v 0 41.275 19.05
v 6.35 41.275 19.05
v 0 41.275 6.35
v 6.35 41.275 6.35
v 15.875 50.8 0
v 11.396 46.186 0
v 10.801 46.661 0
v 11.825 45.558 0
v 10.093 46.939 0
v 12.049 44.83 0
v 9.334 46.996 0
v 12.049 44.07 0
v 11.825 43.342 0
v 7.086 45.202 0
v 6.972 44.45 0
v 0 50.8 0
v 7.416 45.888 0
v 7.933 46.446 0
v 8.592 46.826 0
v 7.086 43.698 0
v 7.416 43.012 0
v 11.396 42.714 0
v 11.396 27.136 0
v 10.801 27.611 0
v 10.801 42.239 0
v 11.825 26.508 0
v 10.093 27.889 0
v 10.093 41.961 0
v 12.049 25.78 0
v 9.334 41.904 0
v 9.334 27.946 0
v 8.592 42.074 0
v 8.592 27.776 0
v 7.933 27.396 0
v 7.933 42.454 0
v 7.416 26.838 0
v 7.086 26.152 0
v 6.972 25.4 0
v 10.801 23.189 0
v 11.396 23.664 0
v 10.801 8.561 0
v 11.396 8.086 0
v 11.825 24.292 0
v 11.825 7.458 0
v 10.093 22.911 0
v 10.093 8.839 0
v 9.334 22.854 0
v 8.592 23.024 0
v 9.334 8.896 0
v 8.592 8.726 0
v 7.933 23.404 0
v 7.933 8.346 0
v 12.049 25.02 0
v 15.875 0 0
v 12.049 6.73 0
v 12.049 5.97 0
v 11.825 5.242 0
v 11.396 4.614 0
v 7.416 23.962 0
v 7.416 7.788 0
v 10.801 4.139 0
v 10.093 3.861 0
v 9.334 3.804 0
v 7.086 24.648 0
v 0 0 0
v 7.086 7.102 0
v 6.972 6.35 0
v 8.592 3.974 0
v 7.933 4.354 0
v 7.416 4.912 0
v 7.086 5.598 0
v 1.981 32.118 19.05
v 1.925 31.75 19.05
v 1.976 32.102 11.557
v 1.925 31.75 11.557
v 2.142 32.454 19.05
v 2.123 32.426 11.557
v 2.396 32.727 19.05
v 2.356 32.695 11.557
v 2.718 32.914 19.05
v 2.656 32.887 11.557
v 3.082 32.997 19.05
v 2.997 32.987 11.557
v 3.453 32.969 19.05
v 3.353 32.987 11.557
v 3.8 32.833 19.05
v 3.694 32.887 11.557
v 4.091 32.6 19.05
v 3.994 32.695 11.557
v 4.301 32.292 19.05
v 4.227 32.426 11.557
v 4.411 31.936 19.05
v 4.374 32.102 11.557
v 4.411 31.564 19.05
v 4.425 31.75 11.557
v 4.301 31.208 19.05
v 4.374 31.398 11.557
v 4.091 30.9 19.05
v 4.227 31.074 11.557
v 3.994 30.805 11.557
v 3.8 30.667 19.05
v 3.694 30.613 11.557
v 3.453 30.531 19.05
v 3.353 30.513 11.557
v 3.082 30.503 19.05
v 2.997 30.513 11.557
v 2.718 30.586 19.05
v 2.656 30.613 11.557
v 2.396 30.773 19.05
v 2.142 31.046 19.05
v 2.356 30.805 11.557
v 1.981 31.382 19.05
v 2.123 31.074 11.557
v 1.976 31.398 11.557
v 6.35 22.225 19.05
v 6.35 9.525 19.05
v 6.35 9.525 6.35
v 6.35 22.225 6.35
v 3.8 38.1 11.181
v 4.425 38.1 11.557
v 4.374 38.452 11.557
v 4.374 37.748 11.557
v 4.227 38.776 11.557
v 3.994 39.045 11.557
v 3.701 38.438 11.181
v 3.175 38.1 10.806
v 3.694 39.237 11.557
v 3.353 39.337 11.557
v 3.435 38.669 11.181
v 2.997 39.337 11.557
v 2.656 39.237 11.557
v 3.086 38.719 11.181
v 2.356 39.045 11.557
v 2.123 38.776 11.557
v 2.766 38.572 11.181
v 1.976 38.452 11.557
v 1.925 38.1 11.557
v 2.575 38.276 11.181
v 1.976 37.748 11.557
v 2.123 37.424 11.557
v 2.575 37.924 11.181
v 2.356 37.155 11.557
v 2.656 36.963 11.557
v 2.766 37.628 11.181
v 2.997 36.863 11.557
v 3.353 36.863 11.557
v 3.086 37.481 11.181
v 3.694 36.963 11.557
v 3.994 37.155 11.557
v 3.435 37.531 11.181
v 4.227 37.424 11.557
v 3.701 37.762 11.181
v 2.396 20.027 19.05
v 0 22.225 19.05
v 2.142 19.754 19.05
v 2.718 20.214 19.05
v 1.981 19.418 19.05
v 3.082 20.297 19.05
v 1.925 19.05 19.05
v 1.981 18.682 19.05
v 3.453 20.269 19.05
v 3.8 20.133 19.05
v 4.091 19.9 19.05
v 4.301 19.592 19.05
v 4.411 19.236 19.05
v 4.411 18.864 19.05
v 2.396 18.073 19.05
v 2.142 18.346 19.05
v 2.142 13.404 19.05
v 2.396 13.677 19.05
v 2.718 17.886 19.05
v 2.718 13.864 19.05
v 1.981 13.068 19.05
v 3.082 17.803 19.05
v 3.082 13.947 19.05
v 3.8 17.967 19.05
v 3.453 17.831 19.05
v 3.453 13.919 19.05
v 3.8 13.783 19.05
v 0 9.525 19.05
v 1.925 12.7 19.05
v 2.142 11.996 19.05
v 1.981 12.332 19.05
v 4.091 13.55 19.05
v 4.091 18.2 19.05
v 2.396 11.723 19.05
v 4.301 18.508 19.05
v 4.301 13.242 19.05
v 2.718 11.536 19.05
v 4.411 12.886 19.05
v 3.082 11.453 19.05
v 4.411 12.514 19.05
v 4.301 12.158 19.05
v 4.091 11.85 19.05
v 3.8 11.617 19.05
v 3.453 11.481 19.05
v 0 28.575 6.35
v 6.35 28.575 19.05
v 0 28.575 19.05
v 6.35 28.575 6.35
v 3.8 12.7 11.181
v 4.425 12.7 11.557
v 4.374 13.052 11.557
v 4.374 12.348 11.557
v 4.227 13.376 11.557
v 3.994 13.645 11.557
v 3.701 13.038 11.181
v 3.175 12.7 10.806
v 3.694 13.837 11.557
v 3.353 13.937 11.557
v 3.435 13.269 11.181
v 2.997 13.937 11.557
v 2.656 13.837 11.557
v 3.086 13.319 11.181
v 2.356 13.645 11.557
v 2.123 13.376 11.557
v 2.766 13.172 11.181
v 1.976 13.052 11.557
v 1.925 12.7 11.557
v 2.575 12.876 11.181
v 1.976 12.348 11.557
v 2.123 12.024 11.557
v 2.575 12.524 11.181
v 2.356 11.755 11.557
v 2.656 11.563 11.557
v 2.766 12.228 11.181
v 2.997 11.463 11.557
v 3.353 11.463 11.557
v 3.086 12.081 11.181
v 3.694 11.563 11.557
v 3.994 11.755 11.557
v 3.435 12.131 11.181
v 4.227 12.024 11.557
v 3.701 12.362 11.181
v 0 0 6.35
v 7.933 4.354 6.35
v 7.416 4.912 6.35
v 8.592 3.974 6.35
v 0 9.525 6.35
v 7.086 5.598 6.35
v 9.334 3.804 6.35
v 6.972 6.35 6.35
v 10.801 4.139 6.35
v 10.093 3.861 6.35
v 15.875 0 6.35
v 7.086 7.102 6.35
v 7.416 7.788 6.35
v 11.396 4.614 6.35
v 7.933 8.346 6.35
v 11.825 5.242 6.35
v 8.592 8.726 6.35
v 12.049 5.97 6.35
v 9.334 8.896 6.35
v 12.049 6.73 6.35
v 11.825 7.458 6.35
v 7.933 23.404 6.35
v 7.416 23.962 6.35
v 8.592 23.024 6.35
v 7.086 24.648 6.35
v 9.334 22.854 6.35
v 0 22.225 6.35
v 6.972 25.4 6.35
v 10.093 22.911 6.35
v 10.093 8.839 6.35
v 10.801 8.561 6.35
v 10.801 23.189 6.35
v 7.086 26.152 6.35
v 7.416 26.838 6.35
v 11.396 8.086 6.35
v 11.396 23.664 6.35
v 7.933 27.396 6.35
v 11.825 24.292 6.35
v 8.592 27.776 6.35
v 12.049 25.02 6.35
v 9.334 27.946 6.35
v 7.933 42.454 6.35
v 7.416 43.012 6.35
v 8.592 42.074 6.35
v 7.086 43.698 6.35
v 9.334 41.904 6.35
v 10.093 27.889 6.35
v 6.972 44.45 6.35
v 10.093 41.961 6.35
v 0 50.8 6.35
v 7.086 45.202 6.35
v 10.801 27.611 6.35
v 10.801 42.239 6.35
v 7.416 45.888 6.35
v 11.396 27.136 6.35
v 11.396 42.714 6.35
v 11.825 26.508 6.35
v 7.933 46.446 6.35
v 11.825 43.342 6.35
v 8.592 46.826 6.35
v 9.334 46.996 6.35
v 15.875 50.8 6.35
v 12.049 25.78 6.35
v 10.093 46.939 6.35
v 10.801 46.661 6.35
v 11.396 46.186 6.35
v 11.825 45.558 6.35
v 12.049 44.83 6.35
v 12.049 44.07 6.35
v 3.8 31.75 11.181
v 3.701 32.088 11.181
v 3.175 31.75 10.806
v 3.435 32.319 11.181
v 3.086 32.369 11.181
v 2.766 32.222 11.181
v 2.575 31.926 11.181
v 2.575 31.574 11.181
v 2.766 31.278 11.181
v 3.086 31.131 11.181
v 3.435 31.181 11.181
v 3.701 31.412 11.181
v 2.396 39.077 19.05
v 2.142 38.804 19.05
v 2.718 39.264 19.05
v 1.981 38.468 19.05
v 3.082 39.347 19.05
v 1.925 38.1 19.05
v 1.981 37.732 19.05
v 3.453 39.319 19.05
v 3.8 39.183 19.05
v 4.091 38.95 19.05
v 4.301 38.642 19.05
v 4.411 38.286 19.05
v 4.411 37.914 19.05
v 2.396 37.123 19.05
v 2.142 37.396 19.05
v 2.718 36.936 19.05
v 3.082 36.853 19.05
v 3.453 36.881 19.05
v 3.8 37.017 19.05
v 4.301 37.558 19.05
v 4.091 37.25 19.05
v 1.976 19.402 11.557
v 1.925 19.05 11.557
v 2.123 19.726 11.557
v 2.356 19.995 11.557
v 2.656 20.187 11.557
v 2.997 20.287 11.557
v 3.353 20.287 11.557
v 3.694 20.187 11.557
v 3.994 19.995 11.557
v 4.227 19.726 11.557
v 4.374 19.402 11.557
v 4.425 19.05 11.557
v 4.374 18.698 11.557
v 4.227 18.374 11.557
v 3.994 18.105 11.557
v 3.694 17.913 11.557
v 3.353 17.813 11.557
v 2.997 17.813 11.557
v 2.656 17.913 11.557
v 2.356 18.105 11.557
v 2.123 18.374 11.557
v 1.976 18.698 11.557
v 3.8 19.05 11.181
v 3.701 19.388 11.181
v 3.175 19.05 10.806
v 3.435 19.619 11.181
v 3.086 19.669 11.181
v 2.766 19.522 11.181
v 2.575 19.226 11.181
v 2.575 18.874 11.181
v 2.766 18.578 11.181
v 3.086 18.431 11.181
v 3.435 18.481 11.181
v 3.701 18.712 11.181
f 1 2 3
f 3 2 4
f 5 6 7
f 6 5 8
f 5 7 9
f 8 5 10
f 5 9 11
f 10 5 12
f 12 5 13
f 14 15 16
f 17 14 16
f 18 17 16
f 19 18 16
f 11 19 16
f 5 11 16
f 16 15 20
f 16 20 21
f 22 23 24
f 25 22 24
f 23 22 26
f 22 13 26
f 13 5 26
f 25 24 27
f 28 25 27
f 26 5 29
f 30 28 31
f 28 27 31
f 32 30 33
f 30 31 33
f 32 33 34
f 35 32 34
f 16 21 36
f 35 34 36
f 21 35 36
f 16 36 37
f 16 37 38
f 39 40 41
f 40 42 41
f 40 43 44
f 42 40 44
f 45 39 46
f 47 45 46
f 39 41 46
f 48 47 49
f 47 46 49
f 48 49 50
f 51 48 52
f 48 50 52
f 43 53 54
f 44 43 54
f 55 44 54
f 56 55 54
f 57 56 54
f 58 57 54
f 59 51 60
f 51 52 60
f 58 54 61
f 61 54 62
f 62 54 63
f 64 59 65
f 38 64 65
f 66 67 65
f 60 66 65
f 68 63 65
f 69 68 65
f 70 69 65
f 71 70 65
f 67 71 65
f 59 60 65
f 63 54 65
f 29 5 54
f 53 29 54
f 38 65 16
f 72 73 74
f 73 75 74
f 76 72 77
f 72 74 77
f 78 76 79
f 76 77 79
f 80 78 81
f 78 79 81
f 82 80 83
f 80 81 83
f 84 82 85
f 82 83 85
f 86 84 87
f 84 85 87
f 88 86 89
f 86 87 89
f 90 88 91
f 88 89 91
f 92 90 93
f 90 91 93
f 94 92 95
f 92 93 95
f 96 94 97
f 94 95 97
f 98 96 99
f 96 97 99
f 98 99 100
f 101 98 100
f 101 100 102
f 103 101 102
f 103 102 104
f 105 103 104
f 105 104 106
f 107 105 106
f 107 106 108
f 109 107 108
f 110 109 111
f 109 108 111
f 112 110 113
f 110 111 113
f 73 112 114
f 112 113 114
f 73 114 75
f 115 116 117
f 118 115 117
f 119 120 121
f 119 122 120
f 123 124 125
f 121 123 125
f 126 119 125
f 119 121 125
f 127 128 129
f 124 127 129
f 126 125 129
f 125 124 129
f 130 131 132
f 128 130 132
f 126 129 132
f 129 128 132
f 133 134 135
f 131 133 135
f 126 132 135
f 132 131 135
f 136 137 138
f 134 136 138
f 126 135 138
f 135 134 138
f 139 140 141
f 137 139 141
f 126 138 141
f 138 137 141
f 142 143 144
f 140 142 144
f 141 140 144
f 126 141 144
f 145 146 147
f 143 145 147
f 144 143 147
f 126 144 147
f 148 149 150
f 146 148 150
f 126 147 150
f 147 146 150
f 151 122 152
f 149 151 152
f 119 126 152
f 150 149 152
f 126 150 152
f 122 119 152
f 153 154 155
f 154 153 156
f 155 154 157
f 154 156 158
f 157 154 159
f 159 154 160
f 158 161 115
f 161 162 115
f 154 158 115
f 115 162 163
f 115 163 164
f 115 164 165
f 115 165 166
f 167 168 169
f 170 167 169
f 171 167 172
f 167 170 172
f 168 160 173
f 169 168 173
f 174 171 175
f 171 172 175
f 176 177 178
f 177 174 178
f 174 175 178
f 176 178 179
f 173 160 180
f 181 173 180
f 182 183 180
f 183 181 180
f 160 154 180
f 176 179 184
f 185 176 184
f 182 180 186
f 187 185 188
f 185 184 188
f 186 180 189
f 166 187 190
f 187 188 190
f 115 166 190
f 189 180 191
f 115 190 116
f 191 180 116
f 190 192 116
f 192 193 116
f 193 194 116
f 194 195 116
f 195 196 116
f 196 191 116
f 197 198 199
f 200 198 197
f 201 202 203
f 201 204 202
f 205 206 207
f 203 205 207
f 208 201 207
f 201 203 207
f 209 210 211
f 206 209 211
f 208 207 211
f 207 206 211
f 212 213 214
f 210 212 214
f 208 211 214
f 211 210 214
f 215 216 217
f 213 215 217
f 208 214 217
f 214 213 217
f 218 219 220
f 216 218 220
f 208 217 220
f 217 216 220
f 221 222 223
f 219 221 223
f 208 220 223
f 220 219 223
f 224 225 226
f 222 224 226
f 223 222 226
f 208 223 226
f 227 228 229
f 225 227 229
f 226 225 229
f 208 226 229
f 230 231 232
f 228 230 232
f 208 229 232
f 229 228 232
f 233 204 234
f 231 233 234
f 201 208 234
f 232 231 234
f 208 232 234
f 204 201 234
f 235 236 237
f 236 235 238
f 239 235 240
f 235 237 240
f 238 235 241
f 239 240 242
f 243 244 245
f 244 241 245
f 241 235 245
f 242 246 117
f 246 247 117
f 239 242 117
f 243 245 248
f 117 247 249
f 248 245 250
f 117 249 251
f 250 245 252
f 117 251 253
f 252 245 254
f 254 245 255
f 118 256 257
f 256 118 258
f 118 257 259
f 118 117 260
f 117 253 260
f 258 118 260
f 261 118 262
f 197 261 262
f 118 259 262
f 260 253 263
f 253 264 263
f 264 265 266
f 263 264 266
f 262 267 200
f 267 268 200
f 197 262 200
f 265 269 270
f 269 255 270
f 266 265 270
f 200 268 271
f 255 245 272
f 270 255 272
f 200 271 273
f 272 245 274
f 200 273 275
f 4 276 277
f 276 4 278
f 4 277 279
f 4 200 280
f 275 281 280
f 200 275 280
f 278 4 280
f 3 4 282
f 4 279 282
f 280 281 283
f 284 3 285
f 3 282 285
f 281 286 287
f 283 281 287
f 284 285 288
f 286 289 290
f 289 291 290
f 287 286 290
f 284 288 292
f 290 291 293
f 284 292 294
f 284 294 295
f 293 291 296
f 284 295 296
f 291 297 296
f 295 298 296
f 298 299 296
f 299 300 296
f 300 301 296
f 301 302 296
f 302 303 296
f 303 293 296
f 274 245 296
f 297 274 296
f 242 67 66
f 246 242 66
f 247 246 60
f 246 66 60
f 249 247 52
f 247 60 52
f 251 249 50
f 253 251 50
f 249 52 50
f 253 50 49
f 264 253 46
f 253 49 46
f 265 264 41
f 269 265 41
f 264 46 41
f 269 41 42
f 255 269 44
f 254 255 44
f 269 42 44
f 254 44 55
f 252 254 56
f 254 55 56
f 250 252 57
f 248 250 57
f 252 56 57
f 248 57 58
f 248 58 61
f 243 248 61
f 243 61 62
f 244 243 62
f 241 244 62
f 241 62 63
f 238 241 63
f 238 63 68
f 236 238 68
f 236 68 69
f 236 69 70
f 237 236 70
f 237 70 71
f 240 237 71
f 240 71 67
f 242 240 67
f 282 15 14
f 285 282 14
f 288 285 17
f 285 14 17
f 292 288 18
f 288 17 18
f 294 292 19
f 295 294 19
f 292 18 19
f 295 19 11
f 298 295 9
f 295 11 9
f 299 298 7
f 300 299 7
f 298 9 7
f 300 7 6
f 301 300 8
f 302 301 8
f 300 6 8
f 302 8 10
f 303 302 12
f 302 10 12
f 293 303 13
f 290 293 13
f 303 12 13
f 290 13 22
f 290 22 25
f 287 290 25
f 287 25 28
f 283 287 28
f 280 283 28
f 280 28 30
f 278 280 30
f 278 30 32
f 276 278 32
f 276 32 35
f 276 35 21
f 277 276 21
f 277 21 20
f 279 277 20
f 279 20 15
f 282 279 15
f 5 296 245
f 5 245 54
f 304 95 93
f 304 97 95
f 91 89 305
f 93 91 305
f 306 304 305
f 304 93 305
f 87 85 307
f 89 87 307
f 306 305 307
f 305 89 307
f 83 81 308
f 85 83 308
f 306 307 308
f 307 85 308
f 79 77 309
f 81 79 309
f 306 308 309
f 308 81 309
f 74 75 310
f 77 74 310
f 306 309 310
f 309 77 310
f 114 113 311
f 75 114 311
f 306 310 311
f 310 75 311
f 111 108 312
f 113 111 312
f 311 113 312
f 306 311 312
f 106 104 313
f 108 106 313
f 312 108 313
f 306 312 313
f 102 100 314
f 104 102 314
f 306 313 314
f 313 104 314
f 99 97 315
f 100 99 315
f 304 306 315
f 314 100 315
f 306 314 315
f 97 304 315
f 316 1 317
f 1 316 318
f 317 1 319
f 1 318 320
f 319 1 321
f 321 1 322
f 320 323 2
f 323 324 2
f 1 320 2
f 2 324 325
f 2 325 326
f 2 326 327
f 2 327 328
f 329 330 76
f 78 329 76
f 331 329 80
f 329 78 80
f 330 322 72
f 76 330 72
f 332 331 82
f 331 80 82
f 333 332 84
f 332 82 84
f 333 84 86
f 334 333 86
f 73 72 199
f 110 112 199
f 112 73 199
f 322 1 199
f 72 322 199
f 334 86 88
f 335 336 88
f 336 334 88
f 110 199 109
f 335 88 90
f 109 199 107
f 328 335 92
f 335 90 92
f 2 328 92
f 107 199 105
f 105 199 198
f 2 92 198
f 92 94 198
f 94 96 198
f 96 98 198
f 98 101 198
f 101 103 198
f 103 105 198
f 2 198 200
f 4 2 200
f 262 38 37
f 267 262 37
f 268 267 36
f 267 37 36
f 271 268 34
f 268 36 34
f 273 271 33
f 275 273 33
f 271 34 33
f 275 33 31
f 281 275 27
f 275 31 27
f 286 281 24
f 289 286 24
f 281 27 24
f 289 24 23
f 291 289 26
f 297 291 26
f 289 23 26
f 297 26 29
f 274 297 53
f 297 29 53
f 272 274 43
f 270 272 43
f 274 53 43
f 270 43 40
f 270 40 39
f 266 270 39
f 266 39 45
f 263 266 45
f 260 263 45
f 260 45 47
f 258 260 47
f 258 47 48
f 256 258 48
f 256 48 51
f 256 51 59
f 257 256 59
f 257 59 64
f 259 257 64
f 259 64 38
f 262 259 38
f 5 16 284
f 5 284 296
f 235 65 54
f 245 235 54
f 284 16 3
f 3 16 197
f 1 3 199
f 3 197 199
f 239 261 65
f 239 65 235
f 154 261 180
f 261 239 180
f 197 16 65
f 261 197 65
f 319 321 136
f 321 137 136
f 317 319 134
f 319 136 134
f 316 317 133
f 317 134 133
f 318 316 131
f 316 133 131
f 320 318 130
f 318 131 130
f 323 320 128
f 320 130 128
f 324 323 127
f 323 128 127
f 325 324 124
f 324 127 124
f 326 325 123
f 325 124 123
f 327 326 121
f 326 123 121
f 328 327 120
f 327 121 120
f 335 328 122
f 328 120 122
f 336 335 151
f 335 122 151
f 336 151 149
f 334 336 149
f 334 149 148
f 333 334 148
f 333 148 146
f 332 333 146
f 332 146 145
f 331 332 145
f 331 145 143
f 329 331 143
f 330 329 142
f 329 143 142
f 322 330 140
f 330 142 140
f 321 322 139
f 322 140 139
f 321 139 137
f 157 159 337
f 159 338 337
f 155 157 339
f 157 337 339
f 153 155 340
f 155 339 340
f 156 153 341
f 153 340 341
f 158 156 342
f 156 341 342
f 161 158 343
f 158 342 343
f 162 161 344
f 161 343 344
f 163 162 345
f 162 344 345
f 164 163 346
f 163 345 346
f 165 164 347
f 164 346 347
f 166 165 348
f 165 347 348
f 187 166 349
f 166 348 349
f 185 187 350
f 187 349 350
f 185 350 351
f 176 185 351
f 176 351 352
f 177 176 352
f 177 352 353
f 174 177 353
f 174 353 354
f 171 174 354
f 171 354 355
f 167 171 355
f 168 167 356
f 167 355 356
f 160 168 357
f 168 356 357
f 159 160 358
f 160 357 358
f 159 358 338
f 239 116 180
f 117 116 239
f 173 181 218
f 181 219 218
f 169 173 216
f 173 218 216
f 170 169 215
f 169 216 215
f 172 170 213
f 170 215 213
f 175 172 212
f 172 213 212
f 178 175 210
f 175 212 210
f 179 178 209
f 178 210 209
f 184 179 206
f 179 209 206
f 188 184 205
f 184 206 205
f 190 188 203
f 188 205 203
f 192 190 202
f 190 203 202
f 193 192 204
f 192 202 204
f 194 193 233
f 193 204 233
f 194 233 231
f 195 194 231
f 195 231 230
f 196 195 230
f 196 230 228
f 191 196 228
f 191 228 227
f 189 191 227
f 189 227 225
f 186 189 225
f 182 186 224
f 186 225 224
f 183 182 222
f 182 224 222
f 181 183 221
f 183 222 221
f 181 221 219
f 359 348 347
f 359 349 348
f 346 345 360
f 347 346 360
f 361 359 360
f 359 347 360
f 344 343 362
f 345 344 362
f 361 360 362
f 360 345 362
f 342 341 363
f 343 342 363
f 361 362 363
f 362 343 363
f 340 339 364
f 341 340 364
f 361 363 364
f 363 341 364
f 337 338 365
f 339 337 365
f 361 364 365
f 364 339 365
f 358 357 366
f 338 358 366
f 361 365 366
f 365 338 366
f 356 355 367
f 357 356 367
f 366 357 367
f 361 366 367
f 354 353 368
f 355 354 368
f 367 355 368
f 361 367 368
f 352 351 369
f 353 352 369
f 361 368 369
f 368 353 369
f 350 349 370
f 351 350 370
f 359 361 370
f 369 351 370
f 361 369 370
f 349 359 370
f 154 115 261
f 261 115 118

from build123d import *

# Parameters (mm, degrees)
BOSS_EXTRUDE1_DEPTH        = 50.8
M3X0_5_TAPPED_HOLE1_D      = 2.5
M3X0_5_TAPPED_HOLE1_DEPTH  = 7.493
M3X0_5_TAPPED_HOLE1_TIP    = 0.751075774
SKETCH8_W                  = 12.7
SKETCH8_H                  = 9.525
SKETCH8_H_2                = 6.35
CUT_EXTRUDE1_DEPTH         = 7.35
F_10_CLEARANCE_HOLE1_D     = 5.1054
F_10_CLEARANCE_HOLE1_DEPTH = 6.35


with BuildPart() as part:
    # Sketch1 → Boss-Extrude1 (new body)
    with BuildSketch(Plane(origin=(0, 0, 0), x_dir=(1, 0, 0), z_dir=(0, 1, 0))):
        Polygon((0, 0), (0, -19.05), (6.35, -19.05), (6.35, -6.35), (15.875, -6.35), (15.875, 0), align=None)
    extrude(amount=BOSS_EXTRUDE1_DEPTH)

    # M3x0.5 Tapped Hole1
    with Locations(Plane.XY.offset(19.05)):
        with Locations((3.175, 38.1), (3.175, 12.7), (3.175, 19.05), (3.175, 31.75)):
            Hole(M3X0_5_TAPPED_HOLE1_D / 2, depth=M3X0_5_TAPPED_HOLE1_DEPTH)
            with Locations((0, 0, -(M3X0_5_TAPPED_HOLE1_DEPTH + M3X0_5_TAPPED_HOLE1_TIP / 2))):  # 118° drill point
                Cone(0, M3X0_5_TAPPED_HOLE1_D / 2, M3X0_5_TAPPED_HOLE1_TIP, mode=Mode.SUBTRACT)

    # Sketch8 → Cut-Extrude1 (cut, through all)
    with BuildSketch(Plane(origin=(6.35, 0, 0), x_dir=(0, 0, -1), z_dir=(1, 0, 0))):
        with Locations((-12.7, 4.7625)):
            Rectangle(SKETCH8_W, SKETCH8_H)
        with Locations((-12.7, 46.0375)):
            Rectangle(SKETCH8_W, SKETCH8_H)
        with Locations((-12.7, 25.4)):
            Rectangle(SKETCH8_W, SKETCH8_H_2)
    extrude(amount=-CUT_EXTRUDE1_DEPTH, mode=Mode.SUBTRACT)

    # #10 Clearance Hole1
    with Locations(Plane.XY.offset(6.35)):
        with Locations((9.525, 6.35), (9.525, 25.4), (9.525, 44.45)):
            Hole(F_10_CLEARANCE_HOLE1_D / 2, depth=F_10_CLEARANCE_HOLE1_DEPTH)


solid = part.part
